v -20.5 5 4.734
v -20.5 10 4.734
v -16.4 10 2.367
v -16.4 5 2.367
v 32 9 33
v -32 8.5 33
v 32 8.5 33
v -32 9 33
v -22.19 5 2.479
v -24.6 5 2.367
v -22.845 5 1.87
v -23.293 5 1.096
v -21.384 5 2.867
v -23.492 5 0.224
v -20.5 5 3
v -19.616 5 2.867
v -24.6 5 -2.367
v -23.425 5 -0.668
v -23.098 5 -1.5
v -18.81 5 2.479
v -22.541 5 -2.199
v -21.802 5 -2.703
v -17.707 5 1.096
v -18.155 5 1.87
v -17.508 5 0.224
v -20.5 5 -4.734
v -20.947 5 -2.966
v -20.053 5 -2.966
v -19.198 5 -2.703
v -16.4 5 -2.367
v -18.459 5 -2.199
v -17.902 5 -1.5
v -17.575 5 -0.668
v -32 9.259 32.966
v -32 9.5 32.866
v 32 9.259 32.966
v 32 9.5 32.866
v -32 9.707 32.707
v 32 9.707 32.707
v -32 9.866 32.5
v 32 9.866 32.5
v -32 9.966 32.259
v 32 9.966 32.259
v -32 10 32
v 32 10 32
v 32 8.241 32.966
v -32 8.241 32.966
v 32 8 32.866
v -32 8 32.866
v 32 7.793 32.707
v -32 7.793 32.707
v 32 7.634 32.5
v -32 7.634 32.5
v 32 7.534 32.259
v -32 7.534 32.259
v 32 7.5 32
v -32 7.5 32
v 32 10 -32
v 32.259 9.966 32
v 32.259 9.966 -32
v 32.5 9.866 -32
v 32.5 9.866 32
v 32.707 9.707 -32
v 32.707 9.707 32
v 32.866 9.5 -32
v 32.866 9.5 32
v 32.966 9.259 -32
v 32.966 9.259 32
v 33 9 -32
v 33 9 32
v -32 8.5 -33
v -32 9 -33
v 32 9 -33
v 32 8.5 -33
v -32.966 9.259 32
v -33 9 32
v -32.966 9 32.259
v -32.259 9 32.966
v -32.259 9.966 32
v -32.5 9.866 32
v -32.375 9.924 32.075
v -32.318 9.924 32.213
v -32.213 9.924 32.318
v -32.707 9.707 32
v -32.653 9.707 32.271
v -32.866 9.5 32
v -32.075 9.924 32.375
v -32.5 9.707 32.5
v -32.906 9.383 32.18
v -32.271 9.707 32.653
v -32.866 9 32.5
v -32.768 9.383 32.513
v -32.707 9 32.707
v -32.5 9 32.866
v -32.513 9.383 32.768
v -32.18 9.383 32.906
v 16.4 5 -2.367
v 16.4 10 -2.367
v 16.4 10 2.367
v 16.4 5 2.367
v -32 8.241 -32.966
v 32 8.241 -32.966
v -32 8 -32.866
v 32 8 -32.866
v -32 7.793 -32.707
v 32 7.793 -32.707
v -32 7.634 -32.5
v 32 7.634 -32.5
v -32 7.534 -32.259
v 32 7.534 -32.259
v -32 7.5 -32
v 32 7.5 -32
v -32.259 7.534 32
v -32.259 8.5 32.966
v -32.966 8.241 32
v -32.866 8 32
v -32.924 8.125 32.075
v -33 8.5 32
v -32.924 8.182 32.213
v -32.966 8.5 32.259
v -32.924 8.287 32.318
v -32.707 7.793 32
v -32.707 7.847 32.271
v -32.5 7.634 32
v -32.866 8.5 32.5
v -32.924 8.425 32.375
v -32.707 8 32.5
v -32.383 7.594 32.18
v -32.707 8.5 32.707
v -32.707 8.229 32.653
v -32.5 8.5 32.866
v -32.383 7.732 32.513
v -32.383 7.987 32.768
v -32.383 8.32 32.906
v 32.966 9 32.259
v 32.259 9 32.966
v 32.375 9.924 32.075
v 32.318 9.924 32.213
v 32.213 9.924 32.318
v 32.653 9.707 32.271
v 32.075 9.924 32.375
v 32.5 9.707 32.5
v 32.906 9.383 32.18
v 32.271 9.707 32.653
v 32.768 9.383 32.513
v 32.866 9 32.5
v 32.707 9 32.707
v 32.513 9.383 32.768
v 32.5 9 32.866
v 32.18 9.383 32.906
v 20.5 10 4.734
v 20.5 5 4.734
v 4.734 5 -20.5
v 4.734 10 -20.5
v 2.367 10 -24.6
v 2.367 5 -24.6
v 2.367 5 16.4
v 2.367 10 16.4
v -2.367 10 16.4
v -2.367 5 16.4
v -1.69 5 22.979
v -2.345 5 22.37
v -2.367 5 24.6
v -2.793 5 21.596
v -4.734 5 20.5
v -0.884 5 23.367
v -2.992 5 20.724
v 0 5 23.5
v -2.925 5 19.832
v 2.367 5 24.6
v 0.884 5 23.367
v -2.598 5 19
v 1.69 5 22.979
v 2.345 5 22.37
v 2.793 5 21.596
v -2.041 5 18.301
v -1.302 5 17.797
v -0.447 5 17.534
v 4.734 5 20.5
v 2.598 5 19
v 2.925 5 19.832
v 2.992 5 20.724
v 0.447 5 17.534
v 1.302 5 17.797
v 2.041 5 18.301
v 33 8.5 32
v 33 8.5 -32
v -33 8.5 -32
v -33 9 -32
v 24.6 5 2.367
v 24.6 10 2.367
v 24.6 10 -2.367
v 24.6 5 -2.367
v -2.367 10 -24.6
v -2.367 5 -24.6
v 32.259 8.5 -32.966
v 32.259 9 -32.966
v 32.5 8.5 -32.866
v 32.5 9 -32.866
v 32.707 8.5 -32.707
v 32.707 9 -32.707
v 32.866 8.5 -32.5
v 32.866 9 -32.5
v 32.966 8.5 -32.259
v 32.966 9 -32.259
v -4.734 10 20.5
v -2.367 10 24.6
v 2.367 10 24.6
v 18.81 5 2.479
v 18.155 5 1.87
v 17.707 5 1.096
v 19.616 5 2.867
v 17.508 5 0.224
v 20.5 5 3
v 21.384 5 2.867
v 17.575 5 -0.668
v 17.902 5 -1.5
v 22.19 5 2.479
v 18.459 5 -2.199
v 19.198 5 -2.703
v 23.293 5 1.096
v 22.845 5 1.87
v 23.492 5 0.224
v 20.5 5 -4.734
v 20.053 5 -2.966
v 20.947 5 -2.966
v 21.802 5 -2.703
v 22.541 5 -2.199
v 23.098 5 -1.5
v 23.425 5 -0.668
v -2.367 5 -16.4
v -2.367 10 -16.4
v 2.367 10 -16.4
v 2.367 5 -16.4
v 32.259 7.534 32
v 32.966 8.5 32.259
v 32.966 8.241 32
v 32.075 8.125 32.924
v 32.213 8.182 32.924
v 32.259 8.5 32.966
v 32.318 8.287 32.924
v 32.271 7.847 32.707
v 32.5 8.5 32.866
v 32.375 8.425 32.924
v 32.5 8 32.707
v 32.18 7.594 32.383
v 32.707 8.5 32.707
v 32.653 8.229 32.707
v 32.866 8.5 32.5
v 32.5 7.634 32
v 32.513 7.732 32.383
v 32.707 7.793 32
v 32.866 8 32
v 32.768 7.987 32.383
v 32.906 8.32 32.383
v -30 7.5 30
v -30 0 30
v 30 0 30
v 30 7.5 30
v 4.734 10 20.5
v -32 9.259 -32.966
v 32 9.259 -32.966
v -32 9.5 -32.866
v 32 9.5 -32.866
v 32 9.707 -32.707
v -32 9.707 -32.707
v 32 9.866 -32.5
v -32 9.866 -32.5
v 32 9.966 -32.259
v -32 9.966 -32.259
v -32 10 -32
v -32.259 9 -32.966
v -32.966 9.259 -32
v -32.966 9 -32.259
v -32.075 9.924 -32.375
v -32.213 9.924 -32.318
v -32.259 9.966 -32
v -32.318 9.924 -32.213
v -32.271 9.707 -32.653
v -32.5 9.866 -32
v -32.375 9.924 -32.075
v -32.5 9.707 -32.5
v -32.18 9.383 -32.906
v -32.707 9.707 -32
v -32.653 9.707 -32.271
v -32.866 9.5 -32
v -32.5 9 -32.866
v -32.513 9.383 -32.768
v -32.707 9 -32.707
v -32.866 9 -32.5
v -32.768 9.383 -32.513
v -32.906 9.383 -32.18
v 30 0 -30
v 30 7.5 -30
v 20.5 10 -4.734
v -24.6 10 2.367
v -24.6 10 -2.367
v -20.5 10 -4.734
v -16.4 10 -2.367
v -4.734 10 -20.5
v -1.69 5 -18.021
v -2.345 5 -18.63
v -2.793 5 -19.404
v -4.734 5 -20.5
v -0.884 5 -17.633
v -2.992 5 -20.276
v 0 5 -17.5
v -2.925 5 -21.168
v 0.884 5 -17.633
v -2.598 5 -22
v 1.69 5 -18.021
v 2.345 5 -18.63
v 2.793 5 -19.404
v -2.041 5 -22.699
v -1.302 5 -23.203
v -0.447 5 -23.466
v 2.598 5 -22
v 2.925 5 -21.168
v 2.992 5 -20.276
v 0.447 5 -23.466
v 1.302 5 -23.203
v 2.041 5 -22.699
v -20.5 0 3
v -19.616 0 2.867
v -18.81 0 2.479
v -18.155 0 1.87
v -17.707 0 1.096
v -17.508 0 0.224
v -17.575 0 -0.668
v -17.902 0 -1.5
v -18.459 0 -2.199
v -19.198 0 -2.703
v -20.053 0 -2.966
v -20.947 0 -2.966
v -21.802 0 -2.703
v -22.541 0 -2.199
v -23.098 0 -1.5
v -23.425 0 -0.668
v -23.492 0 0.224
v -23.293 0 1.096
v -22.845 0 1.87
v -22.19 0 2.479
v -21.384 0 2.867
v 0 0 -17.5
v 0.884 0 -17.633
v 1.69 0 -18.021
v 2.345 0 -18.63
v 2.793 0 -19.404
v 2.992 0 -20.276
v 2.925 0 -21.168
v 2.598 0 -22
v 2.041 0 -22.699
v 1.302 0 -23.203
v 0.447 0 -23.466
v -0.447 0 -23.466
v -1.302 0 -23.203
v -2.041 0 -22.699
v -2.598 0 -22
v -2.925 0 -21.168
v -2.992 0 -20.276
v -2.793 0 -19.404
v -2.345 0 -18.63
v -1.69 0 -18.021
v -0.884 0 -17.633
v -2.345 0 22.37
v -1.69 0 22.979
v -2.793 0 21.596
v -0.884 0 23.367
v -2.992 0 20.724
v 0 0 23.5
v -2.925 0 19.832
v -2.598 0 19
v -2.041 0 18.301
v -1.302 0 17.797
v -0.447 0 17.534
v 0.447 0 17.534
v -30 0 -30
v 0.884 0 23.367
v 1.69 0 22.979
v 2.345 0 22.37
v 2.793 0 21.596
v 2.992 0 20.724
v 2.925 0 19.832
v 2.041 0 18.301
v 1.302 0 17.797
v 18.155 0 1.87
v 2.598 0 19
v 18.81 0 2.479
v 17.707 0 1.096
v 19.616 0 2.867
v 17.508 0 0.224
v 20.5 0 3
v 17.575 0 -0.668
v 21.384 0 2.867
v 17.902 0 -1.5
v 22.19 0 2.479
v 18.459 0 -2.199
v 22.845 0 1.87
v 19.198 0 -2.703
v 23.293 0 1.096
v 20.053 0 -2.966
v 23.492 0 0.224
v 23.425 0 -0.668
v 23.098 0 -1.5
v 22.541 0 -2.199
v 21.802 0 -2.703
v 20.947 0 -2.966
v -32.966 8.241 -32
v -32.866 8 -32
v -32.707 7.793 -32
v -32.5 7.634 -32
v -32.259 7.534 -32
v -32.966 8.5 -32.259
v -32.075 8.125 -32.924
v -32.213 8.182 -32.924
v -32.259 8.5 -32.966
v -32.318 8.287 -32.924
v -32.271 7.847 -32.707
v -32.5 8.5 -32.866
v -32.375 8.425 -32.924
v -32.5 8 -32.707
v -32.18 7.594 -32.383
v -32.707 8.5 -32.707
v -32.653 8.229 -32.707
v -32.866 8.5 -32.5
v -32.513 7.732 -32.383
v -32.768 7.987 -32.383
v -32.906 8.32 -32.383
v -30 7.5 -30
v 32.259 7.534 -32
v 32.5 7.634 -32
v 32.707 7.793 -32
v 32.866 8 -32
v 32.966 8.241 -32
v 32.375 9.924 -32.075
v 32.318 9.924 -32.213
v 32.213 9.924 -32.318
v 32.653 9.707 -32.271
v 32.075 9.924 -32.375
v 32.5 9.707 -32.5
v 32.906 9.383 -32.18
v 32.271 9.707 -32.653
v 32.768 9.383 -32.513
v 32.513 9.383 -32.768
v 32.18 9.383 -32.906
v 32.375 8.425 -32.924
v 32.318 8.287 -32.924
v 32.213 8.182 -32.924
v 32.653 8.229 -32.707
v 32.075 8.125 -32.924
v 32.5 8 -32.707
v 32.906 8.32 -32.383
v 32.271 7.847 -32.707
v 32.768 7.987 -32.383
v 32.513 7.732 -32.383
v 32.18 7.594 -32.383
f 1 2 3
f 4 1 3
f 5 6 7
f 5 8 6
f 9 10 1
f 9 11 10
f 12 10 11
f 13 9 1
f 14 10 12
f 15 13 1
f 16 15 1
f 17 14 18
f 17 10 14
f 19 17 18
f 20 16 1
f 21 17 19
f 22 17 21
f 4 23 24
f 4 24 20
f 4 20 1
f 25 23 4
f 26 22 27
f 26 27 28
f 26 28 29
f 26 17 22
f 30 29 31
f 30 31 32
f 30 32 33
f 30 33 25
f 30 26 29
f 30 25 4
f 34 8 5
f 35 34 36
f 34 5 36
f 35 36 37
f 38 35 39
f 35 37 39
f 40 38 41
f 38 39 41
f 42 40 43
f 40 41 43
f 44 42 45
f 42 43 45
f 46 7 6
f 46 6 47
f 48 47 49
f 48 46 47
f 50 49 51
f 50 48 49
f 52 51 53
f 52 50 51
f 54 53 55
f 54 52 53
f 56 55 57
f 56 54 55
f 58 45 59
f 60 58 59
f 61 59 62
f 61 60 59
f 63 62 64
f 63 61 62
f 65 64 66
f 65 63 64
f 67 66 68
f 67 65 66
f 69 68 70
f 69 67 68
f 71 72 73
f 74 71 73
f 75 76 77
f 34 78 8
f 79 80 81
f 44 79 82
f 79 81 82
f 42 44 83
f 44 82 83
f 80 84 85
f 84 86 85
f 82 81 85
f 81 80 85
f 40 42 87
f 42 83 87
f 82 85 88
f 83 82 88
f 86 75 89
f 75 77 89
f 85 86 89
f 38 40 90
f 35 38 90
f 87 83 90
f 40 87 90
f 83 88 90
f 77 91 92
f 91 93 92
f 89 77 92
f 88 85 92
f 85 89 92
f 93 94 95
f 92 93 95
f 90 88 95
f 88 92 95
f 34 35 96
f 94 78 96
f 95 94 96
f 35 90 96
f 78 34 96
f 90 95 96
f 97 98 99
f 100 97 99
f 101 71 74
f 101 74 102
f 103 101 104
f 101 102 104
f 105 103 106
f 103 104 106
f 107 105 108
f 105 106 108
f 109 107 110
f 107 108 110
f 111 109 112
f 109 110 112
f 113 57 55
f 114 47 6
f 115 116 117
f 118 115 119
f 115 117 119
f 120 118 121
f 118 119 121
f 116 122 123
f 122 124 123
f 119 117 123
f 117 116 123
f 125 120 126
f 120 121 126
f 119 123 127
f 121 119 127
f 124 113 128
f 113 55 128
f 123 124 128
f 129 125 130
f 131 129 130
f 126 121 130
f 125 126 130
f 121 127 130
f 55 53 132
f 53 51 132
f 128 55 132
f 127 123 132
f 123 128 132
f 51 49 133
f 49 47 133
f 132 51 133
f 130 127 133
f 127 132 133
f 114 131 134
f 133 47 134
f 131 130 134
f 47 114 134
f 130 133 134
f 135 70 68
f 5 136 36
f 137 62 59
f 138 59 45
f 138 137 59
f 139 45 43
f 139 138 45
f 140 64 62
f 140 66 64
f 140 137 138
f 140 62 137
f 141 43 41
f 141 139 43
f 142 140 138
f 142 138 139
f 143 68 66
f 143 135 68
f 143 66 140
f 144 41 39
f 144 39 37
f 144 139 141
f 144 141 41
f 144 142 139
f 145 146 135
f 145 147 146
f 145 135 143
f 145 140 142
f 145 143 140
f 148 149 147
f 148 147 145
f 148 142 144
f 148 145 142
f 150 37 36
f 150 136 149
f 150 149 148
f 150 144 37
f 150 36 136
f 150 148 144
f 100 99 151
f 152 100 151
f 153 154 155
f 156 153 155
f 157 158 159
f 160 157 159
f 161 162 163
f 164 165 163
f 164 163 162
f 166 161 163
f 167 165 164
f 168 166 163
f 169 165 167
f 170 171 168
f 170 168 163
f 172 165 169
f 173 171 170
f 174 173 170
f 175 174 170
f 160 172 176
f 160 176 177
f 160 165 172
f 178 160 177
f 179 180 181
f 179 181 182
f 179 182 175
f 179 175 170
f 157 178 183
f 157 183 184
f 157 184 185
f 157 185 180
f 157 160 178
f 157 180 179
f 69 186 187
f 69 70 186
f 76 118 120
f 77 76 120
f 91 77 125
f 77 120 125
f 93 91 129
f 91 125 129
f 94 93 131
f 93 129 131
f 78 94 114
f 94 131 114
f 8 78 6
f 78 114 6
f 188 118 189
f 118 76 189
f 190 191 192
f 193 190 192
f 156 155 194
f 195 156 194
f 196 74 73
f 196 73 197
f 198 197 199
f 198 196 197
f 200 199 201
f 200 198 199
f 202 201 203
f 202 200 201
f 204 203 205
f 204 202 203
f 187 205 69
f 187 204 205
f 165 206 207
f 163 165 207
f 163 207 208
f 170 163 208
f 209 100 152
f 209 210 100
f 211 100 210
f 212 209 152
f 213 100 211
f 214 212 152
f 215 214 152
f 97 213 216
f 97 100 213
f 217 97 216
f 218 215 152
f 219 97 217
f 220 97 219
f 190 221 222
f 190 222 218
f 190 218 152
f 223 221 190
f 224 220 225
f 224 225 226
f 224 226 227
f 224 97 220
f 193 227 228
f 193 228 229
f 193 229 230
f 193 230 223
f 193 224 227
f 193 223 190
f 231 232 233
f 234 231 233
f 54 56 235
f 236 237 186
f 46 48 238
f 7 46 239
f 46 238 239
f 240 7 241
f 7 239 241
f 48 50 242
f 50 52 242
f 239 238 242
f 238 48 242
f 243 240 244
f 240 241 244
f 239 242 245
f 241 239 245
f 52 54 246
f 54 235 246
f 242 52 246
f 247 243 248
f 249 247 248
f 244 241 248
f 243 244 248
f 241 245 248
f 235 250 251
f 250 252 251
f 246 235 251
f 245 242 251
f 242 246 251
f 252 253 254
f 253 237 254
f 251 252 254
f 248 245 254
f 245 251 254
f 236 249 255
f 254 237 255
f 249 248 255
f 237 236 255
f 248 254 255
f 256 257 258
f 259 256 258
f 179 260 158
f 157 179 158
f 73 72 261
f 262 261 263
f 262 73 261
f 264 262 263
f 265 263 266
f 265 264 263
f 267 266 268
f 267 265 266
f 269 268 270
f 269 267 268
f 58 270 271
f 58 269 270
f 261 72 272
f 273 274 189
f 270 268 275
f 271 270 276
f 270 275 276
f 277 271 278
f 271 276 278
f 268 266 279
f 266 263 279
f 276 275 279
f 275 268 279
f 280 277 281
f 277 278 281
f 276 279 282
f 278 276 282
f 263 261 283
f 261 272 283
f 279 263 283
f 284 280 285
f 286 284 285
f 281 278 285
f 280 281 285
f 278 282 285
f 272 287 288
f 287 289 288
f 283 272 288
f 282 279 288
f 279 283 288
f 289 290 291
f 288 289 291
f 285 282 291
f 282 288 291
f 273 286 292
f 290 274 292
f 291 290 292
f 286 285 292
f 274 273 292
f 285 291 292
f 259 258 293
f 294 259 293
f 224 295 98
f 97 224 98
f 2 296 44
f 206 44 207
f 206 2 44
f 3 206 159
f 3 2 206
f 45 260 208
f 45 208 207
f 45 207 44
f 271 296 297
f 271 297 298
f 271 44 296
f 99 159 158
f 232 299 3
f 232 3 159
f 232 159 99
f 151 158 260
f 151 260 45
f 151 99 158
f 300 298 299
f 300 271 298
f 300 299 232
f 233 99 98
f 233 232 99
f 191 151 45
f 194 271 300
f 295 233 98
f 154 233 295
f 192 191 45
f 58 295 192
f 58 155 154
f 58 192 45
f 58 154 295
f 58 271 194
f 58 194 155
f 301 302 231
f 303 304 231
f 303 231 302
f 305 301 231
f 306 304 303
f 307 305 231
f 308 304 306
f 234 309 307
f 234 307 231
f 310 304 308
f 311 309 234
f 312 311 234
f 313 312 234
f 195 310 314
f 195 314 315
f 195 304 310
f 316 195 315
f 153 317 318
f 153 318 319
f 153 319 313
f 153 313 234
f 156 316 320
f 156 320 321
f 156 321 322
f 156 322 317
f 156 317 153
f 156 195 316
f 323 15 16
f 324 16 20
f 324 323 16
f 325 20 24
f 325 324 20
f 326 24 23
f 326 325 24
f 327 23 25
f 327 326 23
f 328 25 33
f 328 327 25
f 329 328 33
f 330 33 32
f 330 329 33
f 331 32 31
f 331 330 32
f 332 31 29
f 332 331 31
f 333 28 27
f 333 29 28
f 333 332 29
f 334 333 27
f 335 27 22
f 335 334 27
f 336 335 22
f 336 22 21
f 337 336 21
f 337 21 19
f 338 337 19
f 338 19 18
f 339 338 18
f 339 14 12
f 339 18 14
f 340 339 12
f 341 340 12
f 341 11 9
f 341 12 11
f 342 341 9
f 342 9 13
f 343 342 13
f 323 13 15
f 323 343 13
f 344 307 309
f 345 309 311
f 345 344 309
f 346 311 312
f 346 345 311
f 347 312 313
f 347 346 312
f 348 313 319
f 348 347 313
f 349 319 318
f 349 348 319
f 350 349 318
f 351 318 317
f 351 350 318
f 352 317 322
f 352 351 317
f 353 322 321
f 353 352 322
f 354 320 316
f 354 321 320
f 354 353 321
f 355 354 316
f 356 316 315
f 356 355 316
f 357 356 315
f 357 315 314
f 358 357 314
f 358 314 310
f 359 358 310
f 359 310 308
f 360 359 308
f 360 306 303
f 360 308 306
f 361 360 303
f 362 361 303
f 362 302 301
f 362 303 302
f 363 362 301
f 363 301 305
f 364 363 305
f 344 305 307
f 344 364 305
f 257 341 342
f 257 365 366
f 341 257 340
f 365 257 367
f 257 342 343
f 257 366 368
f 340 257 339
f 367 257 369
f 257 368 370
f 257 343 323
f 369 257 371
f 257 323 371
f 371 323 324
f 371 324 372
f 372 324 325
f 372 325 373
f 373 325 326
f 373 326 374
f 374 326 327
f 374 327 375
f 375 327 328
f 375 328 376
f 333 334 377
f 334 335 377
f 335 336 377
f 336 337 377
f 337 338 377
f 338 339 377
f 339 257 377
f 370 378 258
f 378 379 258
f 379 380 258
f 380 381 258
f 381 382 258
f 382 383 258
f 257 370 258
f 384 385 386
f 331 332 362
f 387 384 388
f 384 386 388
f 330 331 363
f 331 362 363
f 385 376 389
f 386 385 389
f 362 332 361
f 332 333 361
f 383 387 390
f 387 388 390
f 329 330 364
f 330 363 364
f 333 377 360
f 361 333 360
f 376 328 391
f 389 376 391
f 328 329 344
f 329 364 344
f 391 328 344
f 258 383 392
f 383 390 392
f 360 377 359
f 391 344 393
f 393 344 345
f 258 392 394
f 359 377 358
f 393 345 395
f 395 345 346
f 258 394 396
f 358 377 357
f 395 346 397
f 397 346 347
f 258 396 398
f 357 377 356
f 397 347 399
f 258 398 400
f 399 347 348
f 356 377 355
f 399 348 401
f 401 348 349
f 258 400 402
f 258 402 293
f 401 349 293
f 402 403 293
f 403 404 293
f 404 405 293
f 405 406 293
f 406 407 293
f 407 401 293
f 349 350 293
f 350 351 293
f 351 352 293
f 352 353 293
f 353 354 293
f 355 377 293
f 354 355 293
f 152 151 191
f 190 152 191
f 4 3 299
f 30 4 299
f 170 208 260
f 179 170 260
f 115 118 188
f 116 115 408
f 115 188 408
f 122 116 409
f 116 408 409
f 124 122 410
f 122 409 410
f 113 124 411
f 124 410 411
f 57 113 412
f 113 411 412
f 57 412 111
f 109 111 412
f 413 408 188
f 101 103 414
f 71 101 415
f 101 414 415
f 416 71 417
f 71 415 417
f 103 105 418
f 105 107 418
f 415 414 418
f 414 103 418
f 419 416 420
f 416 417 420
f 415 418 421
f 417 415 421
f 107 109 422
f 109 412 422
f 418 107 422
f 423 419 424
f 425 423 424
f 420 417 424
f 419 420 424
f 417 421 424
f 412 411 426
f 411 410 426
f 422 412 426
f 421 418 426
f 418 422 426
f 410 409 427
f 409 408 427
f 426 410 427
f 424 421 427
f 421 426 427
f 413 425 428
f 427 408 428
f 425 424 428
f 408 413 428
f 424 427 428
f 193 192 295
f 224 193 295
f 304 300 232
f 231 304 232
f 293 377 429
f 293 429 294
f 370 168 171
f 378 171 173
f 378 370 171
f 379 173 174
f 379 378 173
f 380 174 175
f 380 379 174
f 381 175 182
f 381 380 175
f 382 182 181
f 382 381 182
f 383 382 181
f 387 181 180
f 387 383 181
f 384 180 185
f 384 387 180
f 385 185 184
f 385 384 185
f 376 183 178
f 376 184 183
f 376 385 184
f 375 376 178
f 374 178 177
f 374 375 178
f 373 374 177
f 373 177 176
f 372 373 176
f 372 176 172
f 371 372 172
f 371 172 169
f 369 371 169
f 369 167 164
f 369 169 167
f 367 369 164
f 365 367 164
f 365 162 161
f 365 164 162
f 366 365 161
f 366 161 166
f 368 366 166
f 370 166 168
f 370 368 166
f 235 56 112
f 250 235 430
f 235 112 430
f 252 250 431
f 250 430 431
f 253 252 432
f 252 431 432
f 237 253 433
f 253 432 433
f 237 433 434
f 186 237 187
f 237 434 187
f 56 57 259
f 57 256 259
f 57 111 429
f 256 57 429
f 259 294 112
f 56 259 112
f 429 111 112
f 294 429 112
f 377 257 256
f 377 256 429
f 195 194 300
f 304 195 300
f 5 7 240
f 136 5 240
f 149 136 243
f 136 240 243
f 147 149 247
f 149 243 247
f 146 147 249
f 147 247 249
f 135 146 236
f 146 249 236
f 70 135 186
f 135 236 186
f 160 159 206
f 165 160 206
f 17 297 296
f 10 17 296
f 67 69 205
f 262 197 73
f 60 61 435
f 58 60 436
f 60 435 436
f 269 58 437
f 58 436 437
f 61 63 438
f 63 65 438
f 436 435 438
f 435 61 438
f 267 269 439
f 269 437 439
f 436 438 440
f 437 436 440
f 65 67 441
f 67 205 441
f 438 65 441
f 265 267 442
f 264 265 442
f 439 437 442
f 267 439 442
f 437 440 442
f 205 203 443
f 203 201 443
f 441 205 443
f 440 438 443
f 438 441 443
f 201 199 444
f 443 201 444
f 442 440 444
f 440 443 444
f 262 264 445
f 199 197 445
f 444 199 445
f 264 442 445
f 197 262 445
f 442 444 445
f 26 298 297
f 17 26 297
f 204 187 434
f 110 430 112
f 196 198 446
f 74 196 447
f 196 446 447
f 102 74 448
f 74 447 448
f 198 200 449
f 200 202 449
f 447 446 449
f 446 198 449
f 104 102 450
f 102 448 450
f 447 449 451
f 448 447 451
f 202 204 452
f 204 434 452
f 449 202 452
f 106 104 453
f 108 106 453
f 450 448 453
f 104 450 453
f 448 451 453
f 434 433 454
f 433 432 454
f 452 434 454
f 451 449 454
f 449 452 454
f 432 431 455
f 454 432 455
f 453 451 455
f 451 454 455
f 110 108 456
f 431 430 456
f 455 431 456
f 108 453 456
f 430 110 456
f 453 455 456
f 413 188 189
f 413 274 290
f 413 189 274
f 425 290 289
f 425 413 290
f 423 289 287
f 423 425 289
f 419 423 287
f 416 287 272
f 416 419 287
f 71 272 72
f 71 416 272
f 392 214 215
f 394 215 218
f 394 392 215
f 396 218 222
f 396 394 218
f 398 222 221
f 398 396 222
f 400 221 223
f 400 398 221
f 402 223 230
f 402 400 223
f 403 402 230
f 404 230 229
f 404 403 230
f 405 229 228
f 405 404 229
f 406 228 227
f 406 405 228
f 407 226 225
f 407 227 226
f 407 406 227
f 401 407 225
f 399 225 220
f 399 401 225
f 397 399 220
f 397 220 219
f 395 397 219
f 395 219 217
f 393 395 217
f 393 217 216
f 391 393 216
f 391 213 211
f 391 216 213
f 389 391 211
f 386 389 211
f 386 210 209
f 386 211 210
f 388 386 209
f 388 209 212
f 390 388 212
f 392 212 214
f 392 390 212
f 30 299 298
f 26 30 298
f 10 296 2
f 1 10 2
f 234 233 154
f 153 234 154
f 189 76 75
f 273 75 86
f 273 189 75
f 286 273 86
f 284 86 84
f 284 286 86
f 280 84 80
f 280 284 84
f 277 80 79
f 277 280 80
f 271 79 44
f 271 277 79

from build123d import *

# Parameters (mm, degrees)
SKETCH1_W           = 60
SKETCH1_H           = 60
SKETCH1_R           = 3
BOSS_EXTRUDE1_DEPTH = 10
SKETCH2_W           = 66
SKETCH2_H           = 66
SKETCH2_W_2         = 60
SKETCH2_H_2         = 60
BOSS_EXTRUDE2_DEPTH = 2.5
CUT_EXTRUDE1_DEPTH  = 5
FILLET1_R           = 1


with BuildPart() as part:
    # Sketch1 → Boss-Extrude1 (new body)
    with BuildSketch(Plane(origin=(0, 0, 0), x_dir=(1, 0, 0), z_dir=(0, 1, 0))):
        Rectangle(SKETCH1_W, SKETCH1_H)
        with Locations(Location((0, 20.5, 0), (0, 0, 270))):
            Circle(SKETCH1_R, mode=Mode.SUBTRACT)
        with Locations(Location((20.5, 0, 0), (0, 0, 270))):
            Circle(SKETCH1_R, mode=Mode.SUBTRACT)
        with Locations(Location((0, -20.5, 0), (0, 0, 270))):
            Circle(SKETCH1_R, mode=Mode.SUBTRACT)
        with Locations(Location((-20.5, 0, 0), (0, 0, 270))):
            Circle(SKETCH1_R, mode=Mode.SUBTRACT)
    extrude(amount=BOSS_EXTRUDE1_DEPTH)

    # Sketch2 → Boss-Extrude2 (add)
    with BuildSketch(Plane(origin=(0, 10, 0), x_dir=(1, 0, 0), z_dir=(0, 1, 0))):
        Rectangle(SKETCH2_W, SKETCH2_H)
        Rectangle(SKETCH2_W_2, SKETCH2_H_2, mode=Mode.SUBTRACT)
    extrude(amount=-BOSS_EXTRUDE2_DEPTH)

    # Sketch3 → Cut-Extrude1 (cut)
    with BuildSketch(Plane(origin=(0, 10, 0), x_dir=(1, 0, 0), z_dir=(0, 1, 0))):
        Polygon((-4.734272207, 20.5), (-2.367136104, 16.4), (2.367136104, 16.4), (4.734272207, 20.5), (2.367136104, 24.6), (-2.367136104, 24.6), align=None)
        Polygon((-20.5, -4.734272207), (-16.4, -2.367136104), (-16.4, 2.367136104), (-20.5, 4.734272207), (-24.6, 2.367136104), (-24.6, -2.367136104), align=None)
        Polygon((20.5, 4.734272207), (16.4, 2.367136104), (16.4, -2.367136104), (20.5, -4.734272207), (24.6, -2.367136104), (24.6, 2.367136104), align=None)
        Polygon((4.734272207, -20.5), (2.367136104, -16.4), (-2.367136104, -16.4), (-4.734272207, -20.5), (-2.367136104, -24.6), (2.367136104, -24.6), align=None)
    extrude(amount=-CUT_EXTRUDE1_DEPTH, mode=Mode.SUBTRACT)

    # Fillet1
    fillet1_edges = [part.edges().sort_by_distance(p)[0] for p in [
        (33, 7.5, 0),
        (33, 8.75, -33),
        (0, 7.5, 33),
        (33, 8.75, 33),
        (-33, 7.5, 0),
        (-33, 8.75, 33),
        (0, 7.5, -33),
        (-33, 8.75, -33),
        (33, 10, 0),
        (0, 10, -33),
        (-33, 10, 0),
        (0, 10, 33),
    ]]
    fillet(fillet1_edges, radius=FILLET1_R)


solid = part.part
